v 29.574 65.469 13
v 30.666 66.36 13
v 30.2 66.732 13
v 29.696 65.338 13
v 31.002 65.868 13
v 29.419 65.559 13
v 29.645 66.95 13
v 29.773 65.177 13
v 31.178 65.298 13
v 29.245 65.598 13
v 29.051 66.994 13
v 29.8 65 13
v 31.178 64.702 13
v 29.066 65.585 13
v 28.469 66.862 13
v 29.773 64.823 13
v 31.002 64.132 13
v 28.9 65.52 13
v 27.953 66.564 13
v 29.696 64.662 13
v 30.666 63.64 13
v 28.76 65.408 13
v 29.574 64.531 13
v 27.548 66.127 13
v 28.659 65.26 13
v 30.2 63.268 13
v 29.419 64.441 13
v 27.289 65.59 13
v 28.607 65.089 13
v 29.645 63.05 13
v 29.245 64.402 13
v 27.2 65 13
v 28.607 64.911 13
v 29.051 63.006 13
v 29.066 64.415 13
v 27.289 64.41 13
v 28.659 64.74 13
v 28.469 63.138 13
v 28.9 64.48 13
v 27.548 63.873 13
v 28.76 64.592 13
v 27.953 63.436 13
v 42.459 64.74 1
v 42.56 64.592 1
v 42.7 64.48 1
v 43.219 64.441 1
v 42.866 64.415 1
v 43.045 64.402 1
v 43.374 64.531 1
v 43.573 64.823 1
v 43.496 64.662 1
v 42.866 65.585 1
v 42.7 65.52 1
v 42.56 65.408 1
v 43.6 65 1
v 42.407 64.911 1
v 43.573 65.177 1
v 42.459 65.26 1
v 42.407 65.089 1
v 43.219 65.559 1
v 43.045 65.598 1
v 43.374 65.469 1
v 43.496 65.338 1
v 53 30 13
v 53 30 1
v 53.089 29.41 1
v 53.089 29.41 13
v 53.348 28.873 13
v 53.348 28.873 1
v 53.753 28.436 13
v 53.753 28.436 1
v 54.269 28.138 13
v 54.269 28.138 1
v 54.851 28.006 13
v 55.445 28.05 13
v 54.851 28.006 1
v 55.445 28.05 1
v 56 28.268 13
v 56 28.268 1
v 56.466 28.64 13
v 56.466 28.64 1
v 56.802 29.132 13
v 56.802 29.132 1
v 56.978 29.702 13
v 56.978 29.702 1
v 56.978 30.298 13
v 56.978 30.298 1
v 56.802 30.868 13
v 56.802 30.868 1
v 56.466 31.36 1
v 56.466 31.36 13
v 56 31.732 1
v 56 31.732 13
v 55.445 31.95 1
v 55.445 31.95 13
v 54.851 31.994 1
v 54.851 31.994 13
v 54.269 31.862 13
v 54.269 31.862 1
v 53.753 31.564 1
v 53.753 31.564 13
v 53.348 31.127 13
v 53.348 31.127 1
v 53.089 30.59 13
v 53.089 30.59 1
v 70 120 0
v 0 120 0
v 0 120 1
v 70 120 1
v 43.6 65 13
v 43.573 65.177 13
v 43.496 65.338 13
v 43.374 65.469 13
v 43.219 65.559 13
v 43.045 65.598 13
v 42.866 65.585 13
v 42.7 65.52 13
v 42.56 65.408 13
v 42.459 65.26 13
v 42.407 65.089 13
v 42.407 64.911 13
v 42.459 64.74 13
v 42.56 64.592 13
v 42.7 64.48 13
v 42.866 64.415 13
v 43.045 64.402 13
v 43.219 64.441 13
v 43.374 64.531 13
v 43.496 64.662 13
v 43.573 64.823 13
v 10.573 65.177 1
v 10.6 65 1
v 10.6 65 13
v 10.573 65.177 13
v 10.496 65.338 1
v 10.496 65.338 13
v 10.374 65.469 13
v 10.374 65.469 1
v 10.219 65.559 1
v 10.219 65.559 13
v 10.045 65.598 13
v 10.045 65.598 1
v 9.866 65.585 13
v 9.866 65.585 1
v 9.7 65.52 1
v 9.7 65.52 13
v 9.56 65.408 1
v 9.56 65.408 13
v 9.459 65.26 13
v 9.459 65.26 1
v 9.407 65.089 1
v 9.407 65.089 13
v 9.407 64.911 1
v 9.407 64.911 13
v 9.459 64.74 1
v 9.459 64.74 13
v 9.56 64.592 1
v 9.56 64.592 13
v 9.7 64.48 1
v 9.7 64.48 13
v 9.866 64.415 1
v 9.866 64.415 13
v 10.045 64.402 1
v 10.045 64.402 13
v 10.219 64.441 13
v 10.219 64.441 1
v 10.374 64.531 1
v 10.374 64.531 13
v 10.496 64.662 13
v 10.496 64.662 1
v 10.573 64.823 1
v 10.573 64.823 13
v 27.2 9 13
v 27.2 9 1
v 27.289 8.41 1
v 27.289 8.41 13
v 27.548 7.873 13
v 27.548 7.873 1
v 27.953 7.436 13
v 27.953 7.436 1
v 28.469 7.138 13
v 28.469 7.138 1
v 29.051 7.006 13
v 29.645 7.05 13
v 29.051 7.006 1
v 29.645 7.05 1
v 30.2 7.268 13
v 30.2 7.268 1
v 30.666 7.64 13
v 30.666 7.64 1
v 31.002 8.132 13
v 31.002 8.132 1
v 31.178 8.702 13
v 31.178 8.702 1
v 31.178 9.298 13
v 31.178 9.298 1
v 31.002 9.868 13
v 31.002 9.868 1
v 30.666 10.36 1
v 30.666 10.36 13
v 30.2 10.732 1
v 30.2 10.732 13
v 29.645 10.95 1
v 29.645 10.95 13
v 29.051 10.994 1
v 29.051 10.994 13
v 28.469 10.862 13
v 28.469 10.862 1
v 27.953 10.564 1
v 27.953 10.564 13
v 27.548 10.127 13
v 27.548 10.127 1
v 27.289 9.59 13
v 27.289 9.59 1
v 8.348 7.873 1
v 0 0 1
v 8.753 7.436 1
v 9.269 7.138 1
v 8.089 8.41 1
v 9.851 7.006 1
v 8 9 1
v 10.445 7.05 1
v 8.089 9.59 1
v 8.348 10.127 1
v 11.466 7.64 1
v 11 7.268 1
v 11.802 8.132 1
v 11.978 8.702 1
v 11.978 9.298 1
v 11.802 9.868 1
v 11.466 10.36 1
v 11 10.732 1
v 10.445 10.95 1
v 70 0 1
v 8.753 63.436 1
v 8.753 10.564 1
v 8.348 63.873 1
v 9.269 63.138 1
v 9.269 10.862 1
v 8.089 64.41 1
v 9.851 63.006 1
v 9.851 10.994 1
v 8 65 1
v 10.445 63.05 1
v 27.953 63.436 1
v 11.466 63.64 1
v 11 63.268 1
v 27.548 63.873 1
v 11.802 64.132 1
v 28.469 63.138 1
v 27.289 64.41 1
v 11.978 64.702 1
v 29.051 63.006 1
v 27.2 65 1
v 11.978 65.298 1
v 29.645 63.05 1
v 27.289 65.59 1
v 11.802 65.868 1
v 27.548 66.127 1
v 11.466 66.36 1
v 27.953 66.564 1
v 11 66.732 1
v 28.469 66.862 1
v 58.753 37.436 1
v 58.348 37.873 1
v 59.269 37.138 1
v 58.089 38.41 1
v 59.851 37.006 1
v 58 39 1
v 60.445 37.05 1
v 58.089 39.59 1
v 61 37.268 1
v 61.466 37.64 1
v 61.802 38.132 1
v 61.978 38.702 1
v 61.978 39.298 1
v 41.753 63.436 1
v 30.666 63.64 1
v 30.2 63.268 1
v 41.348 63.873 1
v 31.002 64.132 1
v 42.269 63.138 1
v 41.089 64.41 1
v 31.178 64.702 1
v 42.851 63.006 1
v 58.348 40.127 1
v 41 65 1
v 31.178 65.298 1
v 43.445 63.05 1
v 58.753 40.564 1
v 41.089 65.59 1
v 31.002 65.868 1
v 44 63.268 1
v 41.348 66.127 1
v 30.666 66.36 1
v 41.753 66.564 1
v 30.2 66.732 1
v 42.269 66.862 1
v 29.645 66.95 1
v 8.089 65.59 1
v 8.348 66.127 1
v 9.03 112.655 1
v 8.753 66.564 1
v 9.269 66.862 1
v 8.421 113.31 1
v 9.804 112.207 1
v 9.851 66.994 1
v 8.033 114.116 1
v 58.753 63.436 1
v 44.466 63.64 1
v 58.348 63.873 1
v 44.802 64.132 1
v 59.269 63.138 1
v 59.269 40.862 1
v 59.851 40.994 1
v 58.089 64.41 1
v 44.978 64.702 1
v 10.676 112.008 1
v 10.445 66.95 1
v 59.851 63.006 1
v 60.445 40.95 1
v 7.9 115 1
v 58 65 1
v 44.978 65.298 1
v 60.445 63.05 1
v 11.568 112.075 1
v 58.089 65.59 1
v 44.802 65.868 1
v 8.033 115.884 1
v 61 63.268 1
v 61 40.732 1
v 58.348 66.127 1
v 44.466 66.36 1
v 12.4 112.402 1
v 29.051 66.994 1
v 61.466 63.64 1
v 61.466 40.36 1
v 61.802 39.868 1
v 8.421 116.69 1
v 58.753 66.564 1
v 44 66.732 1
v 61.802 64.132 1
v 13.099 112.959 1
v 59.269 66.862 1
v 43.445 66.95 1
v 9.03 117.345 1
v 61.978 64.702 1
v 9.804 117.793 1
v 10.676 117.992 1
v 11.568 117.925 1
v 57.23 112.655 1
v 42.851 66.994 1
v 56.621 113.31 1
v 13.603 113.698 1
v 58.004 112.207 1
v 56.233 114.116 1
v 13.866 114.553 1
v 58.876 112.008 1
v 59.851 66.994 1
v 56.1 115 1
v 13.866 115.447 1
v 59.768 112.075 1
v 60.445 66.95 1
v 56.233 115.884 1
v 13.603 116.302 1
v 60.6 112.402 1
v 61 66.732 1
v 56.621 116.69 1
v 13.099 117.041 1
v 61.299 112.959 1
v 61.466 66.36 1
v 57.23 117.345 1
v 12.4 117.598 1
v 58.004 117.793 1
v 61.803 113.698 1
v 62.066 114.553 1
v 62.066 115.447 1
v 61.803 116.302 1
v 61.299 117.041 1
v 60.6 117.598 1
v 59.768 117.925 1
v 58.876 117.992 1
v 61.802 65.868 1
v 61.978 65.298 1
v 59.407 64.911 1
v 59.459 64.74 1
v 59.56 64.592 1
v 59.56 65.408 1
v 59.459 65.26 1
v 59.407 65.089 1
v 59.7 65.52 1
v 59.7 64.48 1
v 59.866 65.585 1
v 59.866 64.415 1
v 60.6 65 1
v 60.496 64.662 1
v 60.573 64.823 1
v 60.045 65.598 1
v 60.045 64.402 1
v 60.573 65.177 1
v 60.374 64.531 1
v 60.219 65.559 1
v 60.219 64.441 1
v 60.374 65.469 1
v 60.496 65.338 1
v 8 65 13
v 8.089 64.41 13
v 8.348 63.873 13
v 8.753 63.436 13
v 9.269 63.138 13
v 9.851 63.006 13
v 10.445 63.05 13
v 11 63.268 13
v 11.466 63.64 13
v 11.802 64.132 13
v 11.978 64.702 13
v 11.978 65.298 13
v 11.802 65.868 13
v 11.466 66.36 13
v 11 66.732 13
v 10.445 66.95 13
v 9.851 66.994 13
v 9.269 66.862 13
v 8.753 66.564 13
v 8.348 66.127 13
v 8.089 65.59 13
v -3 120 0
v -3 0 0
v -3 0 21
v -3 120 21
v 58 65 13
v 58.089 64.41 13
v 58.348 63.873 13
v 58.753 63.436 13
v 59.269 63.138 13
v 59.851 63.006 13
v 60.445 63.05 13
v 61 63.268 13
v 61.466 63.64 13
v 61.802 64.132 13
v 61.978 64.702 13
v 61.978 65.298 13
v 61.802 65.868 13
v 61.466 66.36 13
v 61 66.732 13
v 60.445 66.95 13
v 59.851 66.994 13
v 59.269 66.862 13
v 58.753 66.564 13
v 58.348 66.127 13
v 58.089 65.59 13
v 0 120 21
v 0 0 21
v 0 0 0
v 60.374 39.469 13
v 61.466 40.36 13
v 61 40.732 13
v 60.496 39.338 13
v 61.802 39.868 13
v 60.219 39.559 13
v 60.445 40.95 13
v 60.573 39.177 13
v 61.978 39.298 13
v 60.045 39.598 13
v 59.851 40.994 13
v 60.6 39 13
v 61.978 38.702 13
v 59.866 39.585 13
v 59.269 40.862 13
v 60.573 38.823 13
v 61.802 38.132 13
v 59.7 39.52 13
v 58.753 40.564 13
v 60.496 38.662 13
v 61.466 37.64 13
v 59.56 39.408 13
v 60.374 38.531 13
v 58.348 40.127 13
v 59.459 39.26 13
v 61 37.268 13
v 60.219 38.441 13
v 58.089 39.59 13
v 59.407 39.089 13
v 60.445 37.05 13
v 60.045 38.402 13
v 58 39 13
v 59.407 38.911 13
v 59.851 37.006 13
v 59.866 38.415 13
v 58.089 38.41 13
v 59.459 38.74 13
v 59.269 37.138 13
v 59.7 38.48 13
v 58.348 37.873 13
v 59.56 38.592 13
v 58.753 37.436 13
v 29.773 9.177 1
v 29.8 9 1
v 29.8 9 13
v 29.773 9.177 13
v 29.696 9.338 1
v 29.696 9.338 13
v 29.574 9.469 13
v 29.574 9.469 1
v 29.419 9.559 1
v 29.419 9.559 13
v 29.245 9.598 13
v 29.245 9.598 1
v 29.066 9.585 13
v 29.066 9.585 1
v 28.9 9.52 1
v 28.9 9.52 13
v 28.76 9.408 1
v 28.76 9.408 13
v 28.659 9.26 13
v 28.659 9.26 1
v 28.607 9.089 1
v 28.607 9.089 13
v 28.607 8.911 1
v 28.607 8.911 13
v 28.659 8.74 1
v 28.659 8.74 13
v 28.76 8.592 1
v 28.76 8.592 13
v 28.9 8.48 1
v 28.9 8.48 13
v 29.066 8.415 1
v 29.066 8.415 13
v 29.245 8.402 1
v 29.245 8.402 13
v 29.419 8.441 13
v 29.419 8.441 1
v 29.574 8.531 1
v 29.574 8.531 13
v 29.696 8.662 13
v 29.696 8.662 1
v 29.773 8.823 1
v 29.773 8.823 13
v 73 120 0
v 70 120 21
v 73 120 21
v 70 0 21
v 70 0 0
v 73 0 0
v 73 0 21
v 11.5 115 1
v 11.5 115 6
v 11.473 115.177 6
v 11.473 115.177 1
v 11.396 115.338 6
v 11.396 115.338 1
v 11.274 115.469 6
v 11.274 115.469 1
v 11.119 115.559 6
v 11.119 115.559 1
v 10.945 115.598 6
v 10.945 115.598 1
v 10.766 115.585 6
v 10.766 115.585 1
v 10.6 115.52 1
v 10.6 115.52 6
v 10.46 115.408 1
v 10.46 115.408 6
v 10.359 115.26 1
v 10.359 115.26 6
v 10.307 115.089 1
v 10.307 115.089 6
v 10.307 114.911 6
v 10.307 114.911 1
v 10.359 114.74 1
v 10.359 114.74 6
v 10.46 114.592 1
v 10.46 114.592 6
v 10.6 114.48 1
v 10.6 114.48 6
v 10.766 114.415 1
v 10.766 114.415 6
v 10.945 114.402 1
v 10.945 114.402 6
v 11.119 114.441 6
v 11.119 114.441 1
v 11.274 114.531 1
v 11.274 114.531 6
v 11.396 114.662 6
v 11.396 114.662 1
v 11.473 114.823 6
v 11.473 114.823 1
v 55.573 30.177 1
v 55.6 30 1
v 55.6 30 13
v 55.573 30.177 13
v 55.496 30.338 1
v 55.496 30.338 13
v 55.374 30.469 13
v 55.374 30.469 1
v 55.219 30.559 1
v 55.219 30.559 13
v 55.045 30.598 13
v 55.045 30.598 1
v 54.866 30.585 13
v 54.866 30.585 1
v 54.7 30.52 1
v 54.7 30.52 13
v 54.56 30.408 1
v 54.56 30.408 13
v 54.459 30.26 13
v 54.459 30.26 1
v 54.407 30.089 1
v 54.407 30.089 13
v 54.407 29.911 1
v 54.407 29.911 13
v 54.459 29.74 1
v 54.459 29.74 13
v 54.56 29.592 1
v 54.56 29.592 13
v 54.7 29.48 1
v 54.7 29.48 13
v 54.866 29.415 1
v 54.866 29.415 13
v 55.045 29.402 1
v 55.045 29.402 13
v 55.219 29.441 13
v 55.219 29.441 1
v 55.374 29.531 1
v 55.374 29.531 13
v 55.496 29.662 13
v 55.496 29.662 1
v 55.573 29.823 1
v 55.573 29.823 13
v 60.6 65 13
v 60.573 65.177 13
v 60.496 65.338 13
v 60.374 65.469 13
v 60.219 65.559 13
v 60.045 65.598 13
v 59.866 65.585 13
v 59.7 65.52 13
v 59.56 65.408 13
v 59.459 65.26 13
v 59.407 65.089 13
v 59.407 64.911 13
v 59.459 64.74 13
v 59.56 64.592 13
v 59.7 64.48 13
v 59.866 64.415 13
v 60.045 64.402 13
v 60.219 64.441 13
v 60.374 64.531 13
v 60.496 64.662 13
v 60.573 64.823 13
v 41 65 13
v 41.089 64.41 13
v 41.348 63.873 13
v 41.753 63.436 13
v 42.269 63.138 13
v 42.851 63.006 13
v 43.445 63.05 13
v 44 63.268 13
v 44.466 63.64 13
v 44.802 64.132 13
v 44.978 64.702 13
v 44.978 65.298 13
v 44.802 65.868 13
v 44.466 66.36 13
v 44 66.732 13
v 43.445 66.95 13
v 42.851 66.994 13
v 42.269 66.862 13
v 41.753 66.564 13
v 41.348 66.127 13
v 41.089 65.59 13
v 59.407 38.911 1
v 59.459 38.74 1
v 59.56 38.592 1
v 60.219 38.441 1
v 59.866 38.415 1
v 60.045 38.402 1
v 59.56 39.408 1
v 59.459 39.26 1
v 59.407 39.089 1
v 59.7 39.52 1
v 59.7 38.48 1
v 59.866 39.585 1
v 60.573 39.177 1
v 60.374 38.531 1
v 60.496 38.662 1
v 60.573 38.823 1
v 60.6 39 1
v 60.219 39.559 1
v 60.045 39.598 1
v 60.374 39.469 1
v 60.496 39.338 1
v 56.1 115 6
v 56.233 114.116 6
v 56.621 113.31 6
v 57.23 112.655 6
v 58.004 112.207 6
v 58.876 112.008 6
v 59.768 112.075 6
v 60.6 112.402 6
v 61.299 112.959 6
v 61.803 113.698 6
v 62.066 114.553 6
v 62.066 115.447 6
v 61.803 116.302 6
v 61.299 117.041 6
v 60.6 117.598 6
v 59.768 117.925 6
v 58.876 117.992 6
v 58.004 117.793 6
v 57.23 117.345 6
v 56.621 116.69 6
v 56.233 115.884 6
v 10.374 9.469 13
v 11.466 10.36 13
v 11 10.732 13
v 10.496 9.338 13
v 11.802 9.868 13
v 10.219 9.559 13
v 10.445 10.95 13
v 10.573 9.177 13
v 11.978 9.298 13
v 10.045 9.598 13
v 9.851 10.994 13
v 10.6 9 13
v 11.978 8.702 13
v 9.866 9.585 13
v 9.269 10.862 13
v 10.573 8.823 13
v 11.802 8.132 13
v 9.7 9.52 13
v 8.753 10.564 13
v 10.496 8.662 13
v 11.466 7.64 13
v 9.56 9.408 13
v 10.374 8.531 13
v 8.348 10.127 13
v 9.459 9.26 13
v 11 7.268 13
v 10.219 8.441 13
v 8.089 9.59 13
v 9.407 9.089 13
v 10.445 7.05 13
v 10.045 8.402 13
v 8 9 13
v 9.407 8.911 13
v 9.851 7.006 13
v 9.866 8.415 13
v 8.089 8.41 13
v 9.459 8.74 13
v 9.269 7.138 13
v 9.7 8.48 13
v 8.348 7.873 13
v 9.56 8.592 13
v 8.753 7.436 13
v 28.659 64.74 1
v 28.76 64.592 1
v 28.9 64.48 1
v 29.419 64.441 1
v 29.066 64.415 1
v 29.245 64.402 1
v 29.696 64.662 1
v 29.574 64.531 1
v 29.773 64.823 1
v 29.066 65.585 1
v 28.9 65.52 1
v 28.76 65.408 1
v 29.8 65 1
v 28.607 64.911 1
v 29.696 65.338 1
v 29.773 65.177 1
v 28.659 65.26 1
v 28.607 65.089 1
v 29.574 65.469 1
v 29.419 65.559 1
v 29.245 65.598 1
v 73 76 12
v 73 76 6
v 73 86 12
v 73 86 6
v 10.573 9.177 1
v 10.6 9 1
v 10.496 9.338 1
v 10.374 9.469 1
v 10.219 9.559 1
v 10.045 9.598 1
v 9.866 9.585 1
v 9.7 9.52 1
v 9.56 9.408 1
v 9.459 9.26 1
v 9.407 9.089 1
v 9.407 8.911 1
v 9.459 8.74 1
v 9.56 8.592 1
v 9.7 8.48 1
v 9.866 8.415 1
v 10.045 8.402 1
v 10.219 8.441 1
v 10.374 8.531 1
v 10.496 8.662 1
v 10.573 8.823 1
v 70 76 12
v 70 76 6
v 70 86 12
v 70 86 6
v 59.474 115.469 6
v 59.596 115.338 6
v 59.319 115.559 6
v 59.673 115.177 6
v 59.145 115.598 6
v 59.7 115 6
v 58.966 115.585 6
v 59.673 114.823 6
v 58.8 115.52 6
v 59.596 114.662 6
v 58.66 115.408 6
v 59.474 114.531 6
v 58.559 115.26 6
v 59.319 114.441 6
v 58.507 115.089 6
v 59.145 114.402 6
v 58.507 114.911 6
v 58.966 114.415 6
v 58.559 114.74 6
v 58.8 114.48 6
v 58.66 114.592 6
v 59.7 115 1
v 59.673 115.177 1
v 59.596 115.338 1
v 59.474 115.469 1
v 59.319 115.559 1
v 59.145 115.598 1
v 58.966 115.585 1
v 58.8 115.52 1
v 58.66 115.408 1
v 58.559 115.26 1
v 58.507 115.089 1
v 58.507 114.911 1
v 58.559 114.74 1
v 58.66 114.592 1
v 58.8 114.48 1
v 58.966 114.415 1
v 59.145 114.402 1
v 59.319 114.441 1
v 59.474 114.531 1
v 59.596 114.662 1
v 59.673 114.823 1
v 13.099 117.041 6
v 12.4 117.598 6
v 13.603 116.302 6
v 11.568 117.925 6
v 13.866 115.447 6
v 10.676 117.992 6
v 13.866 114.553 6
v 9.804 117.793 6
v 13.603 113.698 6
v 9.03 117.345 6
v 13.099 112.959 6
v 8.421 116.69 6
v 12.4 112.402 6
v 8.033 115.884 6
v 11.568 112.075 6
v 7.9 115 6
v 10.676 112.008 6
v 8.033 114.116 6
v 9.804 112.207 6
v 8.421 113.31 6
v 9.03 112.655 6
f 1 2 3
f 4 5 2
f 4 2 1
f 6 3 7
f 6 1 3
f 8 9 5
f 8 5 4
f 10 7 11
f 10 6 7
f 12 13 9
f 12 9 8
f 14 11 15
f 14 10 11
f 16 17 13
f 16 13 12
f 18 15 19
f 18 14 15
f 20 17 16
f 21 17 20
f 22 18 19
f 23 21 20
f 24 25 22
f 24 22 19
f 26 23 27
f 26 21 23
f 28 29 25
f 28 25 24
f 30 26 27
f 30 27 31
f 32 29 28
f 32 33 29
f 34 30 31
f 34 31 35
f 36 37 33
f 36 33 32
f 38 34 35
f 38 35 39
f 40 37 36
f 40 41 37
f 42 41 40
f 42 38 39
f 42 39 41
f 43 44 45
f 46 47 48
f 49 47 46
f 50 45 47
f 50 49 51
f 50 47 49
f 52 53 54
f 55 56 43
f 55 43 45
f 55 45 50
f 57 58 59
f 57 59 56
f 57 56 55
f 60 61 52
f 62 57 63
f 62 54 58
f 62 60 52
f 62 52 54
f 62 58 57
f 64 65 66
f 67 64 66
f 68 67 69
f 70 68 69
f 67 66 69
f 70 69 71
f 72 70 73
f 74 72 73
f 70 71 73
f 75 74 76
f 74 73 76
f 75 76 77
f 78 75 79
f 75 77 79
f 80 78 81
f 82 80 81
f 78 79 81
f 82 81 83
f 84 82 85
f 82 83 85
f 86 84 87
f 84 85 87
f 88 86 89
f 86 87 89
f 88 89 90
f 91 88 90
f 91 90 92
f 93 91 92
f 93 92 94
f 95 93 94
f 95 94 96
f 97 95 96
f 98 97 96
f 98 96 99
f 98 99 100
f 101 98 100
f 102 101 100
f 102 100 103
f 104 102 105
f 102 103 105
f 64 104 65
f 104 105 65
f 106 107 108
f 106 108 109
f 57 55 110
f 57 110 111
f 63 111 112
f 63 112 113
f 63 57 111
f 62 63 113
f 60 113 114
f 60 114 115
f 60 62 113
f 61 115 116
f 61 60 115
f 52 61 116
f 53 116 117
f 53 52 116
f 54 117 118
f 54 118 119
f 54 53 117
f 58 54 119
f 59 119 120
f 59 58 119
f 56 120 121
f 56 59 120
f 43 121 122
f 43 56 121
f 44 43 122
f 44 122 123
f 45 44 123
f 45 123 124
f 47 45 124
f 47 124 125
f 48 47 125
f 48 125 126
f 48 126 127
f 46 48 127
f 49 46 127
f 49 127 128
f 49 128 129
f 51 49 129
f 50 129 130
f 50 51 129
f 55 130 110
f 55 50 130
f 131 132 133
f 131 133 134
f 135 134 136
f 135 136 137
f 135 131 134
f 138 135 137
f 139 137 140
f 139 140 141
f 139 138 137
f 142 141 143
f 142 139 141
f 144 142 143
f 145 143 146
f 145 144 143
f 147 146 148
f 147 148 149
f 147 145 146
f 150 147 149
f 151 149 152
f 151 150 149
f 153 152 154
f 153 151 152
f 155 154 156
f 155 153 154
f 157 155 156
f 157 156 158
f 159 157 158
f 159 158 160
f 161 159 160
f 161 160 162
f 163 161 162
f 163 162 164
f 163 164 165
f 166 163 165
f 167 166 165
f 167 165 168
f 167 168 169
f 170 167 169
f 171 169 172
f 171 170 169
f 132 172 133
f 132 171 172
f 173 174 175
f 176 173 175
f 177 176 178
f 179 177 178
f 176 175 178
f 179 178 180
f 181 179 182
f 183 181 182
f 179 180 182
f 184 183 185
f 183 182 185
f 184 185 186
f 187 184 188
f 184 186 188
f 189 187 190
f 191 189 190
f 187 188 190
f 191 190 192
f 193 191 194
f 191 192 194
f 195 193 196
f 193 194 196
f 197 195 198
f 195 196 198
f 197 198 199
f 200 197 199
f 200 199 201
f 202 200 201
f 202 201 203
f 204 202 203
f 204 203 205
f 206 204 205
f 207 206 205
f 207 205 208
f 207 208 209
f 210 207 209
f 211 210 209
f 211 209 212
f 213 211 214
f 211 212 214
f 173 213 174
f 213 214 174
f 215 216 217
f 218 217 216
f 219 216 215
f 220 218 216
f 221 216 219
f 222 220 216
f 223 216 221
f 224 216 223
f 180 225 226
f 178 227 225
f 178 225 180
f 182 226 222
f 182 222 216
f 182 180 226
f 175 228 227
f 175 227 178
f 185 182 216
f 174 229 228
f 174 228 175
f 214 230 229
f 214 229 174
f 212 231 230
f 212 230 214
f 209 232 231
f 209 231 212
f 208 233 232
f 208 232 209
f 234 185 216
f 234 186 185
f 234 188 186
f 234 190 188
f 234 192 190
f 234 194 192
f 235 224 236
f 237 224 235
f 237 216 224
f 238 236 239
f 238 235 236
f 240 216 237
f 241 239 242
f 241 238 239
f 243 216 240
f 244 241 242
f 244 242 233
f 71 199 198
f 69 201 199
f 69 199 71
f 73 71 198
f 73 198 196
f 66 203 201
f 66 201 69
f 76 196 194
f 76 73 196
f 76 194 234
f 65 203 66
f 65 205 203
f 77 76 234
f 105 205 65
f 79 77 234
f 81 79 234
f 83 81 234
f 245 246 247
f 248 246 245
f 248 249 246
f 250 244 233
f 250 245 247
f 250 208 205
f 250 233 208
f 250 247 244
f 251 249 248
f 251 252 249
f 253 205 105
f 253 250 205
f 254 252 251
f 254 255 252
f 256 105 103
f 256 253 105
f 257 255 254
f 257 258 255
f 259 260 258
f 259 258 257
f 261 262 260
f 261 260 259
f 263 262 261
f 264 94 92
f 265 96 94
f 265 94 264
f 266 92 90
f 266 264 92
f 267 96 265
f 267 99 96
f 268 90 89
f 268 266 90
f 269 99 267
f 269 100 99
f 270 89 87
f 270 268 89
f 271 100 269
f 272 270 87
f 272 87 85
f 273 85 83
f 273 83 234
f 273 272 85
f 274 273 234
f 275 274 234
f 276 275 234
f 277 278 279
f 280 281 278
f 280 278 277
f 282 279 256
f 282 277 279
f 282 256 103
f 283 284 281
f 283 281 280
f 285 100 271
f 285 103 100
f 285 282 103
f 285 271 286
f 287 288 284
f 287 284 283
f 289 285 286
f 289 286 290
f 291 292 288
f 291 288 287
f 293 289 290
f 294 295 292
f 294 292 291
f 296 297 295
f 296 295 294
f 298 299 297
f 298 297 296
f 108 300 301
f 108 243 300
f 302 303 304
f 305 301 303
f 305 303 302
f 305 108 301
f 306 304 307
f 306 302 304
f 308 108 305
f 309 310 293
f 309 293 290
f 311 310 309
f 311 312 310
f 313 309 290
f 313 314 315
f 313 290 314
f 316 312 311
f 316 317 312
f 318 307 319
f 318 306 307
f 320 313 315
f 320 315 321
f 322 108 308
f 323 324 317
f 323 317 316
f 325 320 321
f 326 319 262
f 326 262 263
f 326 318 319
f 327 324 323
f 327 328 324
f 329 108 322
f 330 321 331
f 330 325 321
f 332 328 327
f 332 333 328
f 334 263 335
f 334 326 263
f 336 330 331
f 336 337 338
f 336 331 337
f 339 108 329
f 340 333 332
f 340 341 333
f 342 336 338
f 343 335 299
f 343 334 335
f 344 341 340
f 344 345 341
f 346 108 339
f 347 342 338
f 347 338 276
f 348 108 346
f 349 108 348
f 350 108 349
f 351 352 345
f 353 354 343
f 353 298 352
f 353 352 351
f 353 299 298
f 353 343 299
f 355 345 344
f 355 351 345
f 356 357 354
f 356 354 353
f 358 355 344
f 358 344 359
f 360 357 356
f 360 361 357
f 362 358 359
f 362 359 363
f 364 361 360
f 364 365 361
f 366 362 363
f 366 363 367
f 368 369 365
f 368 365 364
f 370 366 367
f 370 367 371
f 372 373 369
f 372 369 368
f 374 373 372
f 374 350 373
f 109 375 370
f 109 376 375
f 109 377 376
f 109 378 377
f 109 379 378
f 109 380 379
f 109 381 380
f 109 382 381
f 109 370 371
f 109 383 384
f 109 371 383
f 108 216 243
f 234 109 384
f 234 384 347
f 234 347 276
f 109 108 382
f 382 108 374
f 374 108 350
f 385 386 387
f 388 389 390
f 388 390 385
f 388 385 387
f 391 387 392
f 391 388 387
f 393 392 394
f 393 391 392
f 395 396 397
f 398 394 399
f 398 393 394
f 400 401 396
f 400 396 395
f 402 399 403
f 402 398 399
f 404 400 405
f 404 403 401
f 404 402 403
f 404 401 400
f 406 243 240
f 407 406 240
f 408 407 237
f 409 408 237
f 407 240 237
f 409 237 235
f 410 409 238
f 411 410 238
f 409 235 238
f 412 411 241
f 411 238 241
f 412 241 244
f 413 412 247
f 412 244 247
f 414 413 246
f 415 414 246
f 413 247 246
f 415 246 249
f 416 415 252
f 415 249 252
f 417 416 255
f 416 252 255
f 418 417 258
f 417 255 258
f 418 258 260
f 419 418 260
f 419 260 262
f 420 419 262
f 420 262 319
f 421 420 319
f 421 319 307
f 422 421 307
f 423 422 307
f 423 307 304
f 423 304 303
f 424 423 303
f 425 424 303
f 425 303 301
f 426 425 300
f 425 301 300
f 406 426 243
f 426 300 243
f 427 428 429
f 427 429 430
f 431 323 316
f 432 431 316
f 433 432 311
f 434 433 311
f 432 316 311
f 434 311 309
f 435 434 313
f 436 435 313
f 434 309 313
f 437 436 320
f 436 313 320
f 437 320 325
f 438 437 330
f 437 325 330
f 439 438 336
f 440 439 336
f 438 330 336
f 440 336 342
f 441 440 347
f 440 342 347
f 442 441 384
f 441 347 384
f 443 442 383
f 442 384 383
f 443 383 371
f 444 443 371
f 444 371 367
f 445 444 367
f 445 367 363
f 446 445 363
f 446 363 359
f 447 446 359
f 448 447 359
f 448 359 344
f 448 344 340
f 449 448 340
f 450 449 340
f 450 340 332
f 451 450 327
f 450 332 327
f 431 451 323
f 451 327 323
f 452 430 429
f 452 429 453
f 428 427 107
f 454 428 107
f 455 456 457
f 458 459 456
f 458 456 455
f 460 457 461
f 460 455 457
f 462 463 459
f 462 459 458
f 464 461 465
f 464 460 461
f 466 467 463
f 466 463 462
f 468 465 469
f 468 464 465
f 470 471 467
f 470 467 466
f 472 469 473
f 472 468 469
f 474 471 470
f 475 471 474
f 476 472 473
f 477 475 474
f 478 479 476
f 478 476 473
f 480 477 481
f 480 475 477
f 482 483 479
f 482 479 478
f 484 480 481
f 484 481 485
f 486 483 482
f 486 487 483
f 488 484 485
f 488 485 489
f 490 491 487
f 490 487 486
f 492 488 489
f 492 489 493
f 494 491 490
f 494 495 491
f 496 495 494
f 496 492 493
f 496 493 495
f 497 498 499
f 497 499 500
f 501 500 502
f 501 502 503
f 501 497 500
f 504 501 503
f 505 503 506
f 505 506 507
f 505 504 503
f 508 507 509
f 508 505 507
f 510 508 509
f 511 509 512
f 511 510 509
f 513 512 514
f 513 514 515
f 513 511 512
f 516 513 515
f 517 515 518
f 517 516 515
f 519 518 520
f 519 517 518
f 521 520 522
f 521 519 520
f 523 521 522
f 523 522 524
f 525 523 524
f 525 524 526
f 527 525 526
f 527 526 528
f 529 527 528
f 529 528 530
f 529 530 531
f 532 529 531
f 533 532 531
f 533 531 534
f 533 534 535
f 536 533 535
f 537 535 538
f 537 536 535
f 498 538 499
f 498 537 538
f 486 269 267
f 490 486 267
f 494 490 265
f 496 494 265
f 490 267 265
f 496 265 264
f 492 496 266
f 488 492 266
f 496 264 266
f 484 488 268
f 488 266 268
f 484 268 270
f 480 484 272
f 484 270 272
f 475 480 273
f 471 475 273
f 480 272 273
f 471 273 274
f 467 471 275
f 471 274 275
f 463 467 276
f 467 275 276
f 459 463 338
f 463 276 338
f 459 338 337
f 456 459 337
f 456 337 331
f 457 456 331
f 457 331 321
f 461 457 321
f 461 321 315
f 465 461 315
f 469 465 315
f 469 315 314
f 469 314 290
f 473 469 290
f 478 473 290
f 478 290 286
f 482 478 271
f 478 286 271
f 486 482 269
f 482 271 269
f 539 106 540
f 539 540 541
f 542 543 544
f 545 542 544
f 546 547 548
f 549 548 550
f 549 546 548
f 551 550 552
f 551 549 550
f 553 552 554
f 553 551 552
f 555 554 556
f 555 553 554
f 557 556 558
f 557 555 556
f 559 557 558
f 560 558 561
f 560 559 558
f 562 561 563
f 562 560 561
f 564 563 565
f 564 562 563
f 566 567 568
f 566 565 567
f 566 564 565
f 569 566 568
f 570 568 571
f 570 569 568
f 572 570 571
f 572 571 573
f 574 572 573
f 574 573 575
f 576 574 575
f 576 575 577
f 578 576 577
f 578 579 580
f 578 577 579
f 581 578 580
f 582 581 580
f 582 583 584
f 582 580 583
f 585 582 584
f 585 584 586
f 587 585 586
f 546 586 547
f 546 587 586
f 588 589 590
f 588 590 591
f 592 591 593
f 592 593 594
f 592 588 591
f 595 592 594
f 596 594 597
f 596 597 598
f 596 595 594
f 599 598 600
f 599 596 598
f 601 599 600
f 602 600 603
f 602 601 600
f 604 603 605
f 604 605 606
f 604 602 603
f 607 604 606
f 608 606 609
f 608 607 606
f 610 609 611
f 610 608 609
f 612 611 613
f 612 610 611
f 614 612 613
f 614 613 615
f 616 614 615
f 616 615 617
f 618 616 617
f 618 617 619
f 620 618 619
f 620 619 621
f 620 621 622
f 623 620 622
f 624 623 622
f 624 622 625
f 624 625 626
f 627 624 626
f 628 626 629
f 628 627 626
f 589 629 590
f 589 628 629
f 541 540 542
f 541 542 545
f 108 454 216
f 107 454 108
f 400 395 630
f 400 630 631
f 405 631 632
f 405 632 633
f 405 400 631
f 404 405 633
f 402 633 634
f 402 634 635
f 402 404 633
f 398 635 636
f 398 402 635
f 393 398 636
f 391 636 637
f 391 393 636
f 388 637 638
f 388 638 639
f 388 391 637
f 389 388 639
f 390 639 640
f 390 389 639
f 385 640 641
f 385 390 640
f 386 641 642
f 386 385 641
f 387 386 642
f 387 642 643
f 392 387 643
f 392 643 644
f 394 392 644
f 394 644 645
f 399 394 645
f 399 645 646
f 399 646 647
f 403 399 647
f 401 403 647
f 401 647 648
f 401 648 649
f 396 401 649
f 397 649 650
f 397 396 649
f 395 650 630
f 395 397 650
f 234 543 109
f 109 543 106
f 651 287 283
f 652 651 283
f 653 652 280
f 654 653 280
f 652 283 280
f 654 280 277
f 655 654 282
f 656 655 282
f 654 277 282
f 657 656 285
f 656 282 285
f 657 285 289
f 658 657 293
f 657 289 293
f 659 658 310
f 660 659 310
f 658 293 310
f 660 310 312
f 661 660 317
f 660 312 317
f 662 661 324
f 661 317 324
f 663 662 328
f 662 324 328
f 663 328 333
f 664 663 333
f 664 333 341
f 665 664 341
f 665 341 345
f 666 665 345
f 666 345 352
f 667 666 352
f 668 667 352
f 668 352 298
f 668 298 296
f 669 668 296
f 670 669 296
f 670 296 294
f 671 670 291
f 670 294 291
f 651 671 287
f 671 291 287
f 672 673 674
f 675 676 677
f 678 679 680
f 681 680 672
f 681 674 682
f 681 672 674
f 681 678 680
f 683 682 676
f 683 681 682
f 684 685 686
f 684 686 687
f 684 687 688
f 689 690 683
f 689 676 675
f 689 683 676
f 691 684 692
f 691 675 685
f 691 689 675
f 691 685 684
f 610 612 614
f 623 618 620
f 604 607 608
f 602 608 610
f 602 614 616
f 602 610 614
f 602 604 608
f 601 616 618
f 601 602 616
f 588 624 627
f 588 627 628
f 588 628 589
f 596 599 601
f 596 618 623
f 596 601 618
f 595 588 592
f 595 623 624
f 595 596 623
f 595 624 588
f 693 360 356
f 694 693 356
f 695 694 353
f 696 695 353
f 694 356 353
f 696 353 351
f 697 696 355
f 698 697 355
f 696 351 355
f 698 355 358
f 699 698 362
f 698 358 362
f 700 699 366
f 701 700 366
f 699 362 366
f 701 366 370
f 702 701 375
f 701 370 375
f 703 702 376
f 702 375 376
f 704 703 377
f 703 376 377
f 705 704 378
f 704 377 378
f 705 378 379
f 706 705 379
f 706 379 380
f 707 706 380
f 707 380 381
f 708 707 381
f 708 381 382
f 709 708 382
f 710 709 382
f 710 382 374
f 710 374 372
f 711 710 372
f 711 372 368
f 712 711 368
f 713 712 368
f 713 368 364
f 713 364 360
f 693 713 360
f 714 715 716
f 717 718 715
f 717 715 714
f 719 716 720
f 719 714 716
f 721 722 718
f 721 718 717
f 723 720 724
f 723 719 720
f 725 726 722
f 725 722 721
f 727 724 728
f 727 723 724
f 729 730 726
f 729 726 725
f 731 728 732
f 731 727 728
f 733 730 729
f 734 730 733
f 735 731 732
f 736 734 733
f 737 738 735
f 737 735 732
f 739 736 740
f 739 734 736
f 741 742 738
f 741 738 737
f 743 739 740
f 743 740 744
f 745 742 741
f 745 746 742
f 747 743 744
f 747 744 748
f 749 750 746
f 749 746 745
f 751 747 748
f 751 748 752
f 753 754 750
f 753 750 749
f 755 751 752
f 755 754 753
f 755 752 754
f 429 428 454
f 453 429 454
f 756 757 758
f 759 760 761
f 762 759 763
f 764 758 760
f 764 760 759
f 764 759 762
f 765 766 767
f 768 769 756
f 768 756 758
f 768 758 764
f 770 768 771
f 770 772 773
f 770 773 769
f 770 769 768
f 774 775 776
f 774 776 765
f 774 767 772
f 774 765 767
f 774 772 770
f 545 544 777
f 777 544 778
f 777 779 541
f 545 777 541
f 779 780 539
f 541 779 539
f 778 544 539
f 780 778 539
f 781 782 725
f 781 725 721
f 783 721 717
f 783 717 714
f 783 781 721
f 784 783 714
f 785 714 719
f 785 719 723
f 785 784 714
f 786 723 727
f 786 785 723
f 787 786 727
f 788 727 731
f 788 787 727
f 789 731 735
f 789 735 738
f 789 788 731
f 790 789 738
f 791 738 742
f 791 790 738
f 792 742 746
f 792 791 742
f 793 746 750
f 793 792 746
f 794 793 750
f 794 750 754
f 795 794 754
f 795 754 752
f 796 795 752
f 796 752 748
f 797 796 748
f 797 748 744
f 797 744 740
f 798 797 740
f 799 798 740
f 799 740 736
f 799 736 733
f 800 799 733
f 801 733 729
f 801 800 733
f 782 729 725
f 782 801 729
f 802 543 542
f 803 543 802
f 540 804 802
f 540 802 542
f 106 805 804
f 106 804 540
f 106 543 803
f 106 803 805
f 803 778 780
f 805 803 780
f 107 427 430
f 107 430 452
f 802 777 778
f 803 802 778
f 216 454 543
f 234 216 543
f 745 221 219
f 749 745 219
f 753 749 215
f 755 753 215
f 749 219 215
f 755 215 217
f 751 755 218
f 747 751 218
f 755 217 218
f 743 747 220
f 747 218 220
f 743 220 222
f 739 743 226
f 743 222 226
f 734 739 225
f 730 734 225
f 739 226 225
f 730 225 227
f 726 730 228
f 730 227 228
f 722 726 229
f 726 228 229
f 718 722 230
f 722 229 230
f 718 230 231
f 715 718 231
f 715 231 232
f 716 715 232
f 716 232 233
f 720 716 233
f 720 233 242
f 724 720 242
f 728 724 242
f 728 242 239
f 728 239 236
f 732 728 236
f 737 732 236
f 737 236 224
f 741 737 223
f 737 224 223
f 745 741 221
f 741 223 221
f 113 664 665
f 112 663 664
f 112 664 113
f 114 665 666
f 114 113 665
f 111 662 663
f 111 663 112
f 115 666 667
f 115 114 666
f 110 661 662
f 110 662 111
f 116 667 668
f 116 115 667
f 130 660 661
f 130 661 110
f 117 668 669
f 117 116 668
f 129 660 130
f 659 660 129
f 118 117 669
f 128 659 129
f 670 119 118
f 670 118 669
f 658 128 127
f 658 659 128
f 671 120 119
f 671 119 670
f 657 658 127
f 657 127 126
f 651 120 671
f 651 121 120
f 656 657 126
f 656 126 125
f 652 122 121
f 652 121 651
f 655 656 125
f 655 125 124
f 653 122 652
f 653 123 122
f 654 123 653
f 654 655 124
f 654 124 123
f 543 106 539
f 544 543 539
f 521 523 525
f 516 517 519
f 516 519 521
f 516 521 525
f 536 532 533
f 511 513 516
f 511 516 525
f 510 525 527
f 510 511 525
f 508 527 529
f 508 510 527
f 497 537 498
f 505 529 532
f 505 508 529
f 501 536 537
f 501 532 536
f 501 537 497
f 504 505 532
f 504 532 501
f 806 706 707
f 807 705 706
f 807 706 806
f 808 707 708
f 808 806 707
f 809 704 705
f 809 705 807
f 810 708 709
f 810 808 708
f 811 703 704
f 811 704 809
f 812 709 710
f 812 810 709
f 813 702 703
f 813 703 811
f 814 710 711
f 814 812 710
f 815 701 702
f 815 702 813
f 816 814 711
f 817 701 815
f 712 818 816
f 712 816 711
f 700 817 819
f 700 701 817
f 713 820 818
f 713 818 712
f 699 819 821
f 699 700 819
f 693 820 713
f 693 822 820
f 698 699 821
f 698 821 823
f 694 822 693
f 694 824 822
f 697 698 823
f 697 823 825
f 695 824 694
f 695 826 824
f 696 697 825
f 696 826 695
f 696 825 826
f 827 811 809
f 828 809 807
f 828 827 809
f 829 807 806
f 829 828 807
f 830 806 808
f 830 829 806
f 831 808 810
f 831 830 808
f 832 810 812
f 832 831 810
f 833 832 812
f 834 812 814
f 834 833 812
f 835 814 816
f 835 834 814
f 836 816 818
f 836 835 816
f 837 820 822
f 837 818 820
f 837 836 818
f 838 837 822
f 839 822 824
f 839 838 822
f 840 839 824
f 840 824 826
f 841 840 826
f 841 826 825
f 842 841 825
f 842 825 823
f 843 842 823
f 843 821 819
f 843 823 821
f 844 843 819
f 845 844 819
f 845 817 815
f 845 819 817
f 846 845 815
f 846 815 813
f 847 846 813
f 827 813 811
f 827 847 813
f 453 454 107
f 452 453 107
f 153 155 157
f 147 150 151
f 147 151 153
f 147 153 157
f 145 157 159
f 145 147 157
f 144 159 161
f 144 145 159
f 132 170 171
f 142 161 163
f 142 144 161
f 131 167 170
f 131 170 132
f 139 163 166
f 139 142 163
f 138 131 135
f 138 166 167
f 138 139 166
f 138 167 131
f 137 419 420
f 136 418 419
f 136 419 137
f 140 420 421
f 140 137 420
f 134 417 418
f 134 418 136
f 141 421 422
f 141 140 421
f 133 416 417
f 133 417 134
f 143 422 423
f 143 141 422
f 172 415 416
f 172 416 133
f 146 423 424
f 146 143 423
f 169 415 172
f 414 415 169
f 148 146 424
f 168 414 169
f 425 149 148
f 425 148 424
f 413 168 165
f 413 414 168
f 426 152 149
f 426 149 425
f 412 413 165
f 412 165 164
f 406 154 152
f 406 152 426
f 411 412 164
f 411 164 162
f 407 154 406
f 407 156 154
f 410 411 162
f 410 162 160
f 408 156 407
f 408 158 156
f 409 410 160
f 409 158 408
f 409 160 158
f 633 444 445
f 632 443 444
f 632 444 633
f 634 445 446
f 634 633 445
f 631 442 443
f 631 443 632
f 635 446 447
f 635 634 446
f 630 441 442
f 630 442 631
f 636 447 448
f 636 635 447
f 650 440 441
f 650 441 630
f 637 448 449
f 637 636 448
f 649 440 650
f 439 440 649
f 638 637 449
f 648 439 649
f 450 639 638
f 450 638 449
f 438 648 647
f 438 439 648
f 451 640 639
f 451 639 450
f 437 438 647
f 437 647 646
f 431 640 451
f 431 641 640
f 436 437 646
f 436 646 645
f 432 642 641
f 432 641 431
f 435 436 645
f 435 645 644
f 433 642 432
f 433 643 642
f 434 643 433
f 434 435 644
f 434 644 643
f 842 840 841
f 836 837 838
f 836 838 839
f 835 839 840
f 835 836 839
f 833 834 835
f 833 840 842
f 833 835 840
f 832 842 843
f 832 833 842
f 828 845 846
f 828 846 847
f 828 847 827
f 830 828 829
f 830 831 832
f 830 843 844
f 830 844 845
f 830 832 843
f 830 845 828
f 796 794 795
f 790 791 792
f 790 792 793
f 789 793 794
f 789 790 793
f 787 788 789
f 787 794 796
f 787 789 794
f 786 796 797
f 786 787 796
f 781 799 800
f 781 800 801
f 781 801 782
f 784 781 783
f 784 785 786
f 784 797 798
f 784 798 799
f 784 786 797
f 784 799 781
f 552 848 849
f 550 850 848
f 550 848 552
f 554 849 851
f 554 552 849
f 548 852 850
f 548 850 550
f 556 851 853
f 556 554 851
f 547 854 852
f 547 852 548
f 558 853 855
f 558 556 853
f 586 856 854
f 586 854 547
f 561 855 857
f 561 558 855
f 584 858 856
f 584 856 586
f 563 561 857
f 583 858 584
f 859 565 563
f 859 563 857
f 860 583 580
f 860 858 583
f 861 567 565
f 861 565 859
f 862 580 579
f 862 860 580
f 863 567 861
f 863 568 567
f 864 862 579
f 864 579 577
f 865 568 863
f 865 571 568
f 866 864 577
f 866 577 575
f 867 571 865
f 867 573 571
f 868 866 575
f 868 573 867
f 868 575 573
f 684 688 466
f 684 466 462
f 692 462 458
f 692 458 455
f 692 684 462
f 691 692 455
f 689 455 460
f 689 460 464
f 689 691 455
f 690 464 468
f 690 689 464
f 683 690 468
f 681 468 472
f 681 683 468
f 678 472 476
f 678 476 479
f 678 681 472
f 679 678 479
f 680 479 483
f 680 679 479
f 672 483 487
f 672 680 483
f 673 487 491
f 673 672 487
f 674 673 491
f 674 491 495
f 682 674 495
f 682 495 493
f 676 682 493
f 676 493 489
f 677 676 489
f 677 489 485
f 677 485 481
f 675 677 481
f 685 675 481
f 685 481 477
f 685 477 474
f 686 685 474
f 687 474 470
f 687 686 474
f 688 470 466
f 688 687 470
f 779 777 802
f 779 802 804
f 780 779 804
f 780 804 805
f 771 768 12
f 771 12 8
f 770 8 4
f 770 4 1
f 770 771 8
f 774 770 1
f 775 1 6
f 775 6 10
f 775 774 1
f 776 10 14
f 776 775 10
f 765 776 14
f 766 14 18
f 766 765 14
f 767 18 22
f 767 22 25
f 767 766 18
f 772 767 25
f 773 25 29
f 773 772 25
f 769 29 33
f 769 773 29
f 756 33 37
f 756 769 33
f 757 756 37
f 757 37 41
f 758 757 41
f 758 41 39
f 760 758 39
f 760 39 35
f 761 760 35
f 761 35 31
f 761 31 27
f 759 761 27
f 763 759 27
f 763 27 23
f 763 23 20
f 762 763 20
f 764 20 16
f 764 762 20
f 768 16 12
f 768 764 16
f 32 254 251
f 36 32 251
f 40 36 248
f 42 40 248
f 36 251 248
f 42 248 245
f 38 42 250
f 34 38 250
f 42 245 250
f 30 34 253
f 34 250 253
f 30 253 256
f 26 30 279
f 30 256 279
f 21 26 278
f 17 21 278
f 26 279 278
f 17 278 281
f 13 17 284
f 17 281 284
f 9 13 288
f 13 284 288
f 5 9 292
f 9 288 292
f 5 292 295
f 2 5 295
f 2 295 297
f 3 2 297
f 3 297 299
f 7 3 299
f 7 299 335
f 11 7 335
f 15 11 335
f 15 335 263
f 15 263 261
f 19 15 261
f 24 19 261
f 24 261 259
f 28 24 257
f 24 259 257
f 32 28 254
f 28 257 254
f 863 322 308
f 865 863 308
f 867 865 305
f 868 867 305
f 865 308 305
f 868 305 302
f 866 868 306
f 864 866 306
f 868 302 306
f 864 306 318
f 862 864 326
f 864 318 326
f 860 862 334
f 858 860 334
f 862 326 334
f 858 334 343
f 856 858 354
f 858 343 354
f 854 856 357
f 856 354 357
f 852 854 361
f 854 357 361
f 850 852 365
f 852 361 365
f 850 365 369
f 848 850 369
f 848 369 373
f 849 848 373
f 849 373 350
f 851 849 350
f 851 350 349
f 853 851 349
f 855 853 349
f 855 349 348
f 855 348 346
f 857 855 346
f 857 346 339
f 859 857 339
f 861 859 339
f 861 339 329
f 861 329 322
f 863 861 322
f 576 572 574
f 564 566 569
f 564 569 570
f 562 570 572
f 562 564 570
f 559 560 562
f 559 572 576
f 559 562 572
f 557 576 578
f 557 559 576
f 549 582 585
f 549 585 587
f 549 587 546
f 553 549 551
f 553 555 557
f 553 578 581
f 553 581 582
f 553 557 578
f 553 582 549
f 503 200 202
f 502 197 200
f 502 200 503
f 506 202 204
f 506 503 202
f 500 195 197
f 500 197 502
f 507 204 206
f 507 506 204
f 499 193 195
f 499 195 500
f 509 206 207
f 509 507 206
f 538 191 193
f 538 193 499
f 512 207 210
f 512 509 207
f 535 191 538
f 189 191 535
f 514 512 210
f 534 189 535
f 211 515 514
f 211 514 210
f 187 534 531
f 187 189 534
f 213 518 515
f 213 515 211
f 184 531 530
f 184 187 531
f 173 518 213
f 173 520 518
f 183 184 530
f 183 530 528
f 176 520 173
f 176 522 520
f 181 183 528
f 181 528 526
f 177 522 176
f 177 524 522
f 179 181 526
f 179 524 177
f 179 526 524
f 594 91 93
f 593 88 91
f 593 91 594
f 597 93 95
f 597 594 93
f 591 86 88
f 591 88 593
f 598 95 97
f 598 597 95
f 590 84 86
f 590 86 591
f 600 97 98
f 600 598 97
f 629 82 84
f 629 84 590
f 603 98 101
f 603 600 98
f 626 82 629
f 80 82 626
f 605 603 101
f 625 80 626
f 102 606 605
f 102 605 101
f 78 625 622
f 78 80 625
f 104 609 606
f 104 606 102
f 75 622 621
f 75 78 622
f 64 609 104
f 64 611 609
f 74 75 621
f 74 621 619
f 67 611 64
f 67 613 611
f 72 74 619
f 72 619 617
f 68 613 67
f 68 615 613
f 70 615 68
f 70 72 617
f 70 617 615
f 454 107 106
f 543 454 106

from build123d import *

# Parameters (mm, degrees)
SKICA1_W                       = 70
SKICA1_H                       = 120
P_IDAT_VYSUNUT_M1_DEPTH        = 1
SKICA2_R                       = 2
SKICA2_R_2                     = 0.6
SKICA2_R_3                     = 3
P_IDAT_VYSUNUT_M2_DEPTH        = 12
P_IDAT_VYSUNUT_M3_DEPTH        = 20
P_IDAT_VYSUNUT_M3_DEPTH_BACK   = 1
SKICA4_W                       = 3
SKICA4_H                       = 120
P_IDAT_VYSUNUT_M3_2_DEPTH      = 20
P_IDAT_VYSUNUT_M3_2_DEPTH_BACK = 1
SKICA5_W                       = 6
SKICA5_H                       = 10
ODEBRAT_VYSUNUT_M2_DEPTH       = 20
ODEBRAT_START                  = -7
SKICA6_R                       = 3
ODEBRAT_VYSUNUT_M3_DEPTH       = 7


with BuildPart() as part:
    # Skica1 → Přidat vysunutím1 (new body)
    with BuildSketch(Plane.XY):
        with Locations((35, 60)):
            Rectangle(SKICA1_W, SKICA1_H)
    extrude(amount=P_IDAT_VYSUNUT_M1_DEPTH)

    # Skica2 → Přidat vysunutím2 (add)
    # profile 1 of 10: a face of its own
    with BuildSketch(Plane.XY.offset(1)):
        with Locations(Location((10, 65, 0), (0, 0, 180))):
            Circle(SKICA2_R)
        with Locations((10, 65)):
            Circle(SKICA2_R_2, mode=Mode.SUBTRACT)
    # profile 2 of 10: a face of its own
    with BuildSketch(Plane.XY.offset(1)):
        with Locations(Location((29.2, 65, 0), (0, 0, 180))):
            Circle(SKICA2_R)
        with Locations((29.2, 65)):
            Circle(SKICA2_R_2, mode=Mode.SUBTRACT)
    # profile 3 of 10: a face of its own
    with BuildSketch(Plane.XY.offset(1)):
        with Locations(Location((43, 65, 0), (0, 0, 180))):
            Circle(SKICA2_R)
        with Locations((43, 65)):
            Circle(SKICA2_R_2, mode=Mode.SUBTRACT)
    # profile 4 of 10: a face of its own
    with BuildSketch(Plane.XY.offset(1)):
        with Locations(Location((60, 65, 0), (0, 0, 180))):
            Circle(SKICA2_R)
        with Locations((60, 65)):
            Circle(SKICA2_R_2, mode=Mode.SUBTRACT)
    # profile 5 of 10: a face of its own
    with BuildSketch(Plane.XY.offset(1)):
        with Locations(Location((60, 39, 0), (0, 0, 180))):
            Circle(SKICA2_R)
        with Locations((60, 39)):
            Circle(SKICA2_R_2, mode=Mode.SUBTRACT)
    # profile 6 of 10: a face of its own
    with BuildSketch(Plane.XY.offset(1)):
        with Locations(Location((55, 30, 0), (0, 0, 180))):
            Circle(SKICA2_R)
        with Locations((55, 30)):
            Circle(SKICA2_R_2, mode=Mode.SUBTRACT)
    # profile 7 of 10: a face of its own
    with BuildSketch(Plane.XY.offset(1)):
        with Locations(Location((29.2, 9, 0), (0, 0, 180))):
            Circle(SKICA2_R)
        with Locations((29.2, 9)):
            Circle(SKICA2_R_2, mode=Mode.SUBTRACT)
    # profile 8 of 10: a face of its own
    with BuildSketch(Plane.XY.offset(1)):
        with Locations(Location((10, 9.000006063, 0), (0, 0, 180))):
            Circle(SKICA2_R)
        with Locations((10, 9.000006063)):
            Circle(SKICA2_R_2, mode=Mode.SUBTRACT)
    # profile 9 of 10: a face of its own
    with BuildSketch(Plane.XY.offset(1)):
        with Locations(Location((10.9, 115, 0), (0, 0, 180))):
            Circle(SKICA2_R_3)
        with Locations((10.9, 115)):
            Circle(SKICA2_R_2, mode=Mode.SUBTRACT)
    # profile 10 of 10: a face of its own
    with BuildSketch(Plane.XY.offset(1)):
        with Locations(Location((59.1, 115, 0), (0, 0, 180))):
            Circle(SKICA2_R_3)
        with Locations((59.1, 115)):
            Circle(SKICA2_R_2, mode=Mode.SUBTRACT)
    extrude(amount=P_IDAT_VYSUNUT_M2_DEPTH)

    # Skica6 → Odebrat vysunutím3 (cut)
    with BuildSketch(Plane.XY.offset(13).offset(ODEBRAT_START)):
        with Locations(Location((10.9, 115, 0), (0, 0, 180))):
            Circle(SKICA6_R)
        with Locations(Location((59.1, 115, 0), (0, 0, 180))):
            Circle(SKICA6_R)
    extrude(amount=ODEBRAT_VYSUNUT_M3_DEPTH, mode=Mode.SUBTRACT)


with BuildPart() as body_2:
    # Skica4 → Přidat vysunutím3 (new, two sides: drawn at the far end of the back side and taken through both)
    with BuildSketch(Plane.XY.offset(1).offset(-P_IDAT_VYSUNUT_M3_DEPTH_BACK)):
        with Locations((-1.5, 60)):
            Rectangle(SKICA4_W, SKICA4_H)
    extrude(amount=P_IDAT_VYSUNUT_M3_DEPTH + P_IDAT_VYSUNUT_M3_DEPTH_BACK)


with BuildPart() as body_3:
    # Skica4 → P_idat vysunut_m3 2 (new, two sides: drawn at the far end of the back side and taken through both)
    with BuildSketch(Plane.XY.offset(1).offset(-P_IDAT_VYSUNUT_M3_2_DEPTH_BACK)):
        with Locations((71.5, 60)):
            Rectangle(SKICA4_W, SKICA4_H)
    extrude(amount=P_IDAT_VYSUNUT_M3_2_DEPTH + P_IDAT_VYSUNUT_M3_2_DEPTH_BACK)

    # Skica5 → Odebrat vysunutím2 (cut)
    with BuildSketch(Plane(origin=(73, 0, 0), x_dir=(0, 0, -1), z_dir=(1, 0, 0))):
        with Locations((-9, 81)):
            Rectangle(SKICA5_W, SKICA5_H)
    extrude(amount=-ODEBRAT_VYSUNUT_M2_DEPTH, mode=Mode.SUBTRACT)


solid = Compound([part.part, body_2.part, body_3.part])
